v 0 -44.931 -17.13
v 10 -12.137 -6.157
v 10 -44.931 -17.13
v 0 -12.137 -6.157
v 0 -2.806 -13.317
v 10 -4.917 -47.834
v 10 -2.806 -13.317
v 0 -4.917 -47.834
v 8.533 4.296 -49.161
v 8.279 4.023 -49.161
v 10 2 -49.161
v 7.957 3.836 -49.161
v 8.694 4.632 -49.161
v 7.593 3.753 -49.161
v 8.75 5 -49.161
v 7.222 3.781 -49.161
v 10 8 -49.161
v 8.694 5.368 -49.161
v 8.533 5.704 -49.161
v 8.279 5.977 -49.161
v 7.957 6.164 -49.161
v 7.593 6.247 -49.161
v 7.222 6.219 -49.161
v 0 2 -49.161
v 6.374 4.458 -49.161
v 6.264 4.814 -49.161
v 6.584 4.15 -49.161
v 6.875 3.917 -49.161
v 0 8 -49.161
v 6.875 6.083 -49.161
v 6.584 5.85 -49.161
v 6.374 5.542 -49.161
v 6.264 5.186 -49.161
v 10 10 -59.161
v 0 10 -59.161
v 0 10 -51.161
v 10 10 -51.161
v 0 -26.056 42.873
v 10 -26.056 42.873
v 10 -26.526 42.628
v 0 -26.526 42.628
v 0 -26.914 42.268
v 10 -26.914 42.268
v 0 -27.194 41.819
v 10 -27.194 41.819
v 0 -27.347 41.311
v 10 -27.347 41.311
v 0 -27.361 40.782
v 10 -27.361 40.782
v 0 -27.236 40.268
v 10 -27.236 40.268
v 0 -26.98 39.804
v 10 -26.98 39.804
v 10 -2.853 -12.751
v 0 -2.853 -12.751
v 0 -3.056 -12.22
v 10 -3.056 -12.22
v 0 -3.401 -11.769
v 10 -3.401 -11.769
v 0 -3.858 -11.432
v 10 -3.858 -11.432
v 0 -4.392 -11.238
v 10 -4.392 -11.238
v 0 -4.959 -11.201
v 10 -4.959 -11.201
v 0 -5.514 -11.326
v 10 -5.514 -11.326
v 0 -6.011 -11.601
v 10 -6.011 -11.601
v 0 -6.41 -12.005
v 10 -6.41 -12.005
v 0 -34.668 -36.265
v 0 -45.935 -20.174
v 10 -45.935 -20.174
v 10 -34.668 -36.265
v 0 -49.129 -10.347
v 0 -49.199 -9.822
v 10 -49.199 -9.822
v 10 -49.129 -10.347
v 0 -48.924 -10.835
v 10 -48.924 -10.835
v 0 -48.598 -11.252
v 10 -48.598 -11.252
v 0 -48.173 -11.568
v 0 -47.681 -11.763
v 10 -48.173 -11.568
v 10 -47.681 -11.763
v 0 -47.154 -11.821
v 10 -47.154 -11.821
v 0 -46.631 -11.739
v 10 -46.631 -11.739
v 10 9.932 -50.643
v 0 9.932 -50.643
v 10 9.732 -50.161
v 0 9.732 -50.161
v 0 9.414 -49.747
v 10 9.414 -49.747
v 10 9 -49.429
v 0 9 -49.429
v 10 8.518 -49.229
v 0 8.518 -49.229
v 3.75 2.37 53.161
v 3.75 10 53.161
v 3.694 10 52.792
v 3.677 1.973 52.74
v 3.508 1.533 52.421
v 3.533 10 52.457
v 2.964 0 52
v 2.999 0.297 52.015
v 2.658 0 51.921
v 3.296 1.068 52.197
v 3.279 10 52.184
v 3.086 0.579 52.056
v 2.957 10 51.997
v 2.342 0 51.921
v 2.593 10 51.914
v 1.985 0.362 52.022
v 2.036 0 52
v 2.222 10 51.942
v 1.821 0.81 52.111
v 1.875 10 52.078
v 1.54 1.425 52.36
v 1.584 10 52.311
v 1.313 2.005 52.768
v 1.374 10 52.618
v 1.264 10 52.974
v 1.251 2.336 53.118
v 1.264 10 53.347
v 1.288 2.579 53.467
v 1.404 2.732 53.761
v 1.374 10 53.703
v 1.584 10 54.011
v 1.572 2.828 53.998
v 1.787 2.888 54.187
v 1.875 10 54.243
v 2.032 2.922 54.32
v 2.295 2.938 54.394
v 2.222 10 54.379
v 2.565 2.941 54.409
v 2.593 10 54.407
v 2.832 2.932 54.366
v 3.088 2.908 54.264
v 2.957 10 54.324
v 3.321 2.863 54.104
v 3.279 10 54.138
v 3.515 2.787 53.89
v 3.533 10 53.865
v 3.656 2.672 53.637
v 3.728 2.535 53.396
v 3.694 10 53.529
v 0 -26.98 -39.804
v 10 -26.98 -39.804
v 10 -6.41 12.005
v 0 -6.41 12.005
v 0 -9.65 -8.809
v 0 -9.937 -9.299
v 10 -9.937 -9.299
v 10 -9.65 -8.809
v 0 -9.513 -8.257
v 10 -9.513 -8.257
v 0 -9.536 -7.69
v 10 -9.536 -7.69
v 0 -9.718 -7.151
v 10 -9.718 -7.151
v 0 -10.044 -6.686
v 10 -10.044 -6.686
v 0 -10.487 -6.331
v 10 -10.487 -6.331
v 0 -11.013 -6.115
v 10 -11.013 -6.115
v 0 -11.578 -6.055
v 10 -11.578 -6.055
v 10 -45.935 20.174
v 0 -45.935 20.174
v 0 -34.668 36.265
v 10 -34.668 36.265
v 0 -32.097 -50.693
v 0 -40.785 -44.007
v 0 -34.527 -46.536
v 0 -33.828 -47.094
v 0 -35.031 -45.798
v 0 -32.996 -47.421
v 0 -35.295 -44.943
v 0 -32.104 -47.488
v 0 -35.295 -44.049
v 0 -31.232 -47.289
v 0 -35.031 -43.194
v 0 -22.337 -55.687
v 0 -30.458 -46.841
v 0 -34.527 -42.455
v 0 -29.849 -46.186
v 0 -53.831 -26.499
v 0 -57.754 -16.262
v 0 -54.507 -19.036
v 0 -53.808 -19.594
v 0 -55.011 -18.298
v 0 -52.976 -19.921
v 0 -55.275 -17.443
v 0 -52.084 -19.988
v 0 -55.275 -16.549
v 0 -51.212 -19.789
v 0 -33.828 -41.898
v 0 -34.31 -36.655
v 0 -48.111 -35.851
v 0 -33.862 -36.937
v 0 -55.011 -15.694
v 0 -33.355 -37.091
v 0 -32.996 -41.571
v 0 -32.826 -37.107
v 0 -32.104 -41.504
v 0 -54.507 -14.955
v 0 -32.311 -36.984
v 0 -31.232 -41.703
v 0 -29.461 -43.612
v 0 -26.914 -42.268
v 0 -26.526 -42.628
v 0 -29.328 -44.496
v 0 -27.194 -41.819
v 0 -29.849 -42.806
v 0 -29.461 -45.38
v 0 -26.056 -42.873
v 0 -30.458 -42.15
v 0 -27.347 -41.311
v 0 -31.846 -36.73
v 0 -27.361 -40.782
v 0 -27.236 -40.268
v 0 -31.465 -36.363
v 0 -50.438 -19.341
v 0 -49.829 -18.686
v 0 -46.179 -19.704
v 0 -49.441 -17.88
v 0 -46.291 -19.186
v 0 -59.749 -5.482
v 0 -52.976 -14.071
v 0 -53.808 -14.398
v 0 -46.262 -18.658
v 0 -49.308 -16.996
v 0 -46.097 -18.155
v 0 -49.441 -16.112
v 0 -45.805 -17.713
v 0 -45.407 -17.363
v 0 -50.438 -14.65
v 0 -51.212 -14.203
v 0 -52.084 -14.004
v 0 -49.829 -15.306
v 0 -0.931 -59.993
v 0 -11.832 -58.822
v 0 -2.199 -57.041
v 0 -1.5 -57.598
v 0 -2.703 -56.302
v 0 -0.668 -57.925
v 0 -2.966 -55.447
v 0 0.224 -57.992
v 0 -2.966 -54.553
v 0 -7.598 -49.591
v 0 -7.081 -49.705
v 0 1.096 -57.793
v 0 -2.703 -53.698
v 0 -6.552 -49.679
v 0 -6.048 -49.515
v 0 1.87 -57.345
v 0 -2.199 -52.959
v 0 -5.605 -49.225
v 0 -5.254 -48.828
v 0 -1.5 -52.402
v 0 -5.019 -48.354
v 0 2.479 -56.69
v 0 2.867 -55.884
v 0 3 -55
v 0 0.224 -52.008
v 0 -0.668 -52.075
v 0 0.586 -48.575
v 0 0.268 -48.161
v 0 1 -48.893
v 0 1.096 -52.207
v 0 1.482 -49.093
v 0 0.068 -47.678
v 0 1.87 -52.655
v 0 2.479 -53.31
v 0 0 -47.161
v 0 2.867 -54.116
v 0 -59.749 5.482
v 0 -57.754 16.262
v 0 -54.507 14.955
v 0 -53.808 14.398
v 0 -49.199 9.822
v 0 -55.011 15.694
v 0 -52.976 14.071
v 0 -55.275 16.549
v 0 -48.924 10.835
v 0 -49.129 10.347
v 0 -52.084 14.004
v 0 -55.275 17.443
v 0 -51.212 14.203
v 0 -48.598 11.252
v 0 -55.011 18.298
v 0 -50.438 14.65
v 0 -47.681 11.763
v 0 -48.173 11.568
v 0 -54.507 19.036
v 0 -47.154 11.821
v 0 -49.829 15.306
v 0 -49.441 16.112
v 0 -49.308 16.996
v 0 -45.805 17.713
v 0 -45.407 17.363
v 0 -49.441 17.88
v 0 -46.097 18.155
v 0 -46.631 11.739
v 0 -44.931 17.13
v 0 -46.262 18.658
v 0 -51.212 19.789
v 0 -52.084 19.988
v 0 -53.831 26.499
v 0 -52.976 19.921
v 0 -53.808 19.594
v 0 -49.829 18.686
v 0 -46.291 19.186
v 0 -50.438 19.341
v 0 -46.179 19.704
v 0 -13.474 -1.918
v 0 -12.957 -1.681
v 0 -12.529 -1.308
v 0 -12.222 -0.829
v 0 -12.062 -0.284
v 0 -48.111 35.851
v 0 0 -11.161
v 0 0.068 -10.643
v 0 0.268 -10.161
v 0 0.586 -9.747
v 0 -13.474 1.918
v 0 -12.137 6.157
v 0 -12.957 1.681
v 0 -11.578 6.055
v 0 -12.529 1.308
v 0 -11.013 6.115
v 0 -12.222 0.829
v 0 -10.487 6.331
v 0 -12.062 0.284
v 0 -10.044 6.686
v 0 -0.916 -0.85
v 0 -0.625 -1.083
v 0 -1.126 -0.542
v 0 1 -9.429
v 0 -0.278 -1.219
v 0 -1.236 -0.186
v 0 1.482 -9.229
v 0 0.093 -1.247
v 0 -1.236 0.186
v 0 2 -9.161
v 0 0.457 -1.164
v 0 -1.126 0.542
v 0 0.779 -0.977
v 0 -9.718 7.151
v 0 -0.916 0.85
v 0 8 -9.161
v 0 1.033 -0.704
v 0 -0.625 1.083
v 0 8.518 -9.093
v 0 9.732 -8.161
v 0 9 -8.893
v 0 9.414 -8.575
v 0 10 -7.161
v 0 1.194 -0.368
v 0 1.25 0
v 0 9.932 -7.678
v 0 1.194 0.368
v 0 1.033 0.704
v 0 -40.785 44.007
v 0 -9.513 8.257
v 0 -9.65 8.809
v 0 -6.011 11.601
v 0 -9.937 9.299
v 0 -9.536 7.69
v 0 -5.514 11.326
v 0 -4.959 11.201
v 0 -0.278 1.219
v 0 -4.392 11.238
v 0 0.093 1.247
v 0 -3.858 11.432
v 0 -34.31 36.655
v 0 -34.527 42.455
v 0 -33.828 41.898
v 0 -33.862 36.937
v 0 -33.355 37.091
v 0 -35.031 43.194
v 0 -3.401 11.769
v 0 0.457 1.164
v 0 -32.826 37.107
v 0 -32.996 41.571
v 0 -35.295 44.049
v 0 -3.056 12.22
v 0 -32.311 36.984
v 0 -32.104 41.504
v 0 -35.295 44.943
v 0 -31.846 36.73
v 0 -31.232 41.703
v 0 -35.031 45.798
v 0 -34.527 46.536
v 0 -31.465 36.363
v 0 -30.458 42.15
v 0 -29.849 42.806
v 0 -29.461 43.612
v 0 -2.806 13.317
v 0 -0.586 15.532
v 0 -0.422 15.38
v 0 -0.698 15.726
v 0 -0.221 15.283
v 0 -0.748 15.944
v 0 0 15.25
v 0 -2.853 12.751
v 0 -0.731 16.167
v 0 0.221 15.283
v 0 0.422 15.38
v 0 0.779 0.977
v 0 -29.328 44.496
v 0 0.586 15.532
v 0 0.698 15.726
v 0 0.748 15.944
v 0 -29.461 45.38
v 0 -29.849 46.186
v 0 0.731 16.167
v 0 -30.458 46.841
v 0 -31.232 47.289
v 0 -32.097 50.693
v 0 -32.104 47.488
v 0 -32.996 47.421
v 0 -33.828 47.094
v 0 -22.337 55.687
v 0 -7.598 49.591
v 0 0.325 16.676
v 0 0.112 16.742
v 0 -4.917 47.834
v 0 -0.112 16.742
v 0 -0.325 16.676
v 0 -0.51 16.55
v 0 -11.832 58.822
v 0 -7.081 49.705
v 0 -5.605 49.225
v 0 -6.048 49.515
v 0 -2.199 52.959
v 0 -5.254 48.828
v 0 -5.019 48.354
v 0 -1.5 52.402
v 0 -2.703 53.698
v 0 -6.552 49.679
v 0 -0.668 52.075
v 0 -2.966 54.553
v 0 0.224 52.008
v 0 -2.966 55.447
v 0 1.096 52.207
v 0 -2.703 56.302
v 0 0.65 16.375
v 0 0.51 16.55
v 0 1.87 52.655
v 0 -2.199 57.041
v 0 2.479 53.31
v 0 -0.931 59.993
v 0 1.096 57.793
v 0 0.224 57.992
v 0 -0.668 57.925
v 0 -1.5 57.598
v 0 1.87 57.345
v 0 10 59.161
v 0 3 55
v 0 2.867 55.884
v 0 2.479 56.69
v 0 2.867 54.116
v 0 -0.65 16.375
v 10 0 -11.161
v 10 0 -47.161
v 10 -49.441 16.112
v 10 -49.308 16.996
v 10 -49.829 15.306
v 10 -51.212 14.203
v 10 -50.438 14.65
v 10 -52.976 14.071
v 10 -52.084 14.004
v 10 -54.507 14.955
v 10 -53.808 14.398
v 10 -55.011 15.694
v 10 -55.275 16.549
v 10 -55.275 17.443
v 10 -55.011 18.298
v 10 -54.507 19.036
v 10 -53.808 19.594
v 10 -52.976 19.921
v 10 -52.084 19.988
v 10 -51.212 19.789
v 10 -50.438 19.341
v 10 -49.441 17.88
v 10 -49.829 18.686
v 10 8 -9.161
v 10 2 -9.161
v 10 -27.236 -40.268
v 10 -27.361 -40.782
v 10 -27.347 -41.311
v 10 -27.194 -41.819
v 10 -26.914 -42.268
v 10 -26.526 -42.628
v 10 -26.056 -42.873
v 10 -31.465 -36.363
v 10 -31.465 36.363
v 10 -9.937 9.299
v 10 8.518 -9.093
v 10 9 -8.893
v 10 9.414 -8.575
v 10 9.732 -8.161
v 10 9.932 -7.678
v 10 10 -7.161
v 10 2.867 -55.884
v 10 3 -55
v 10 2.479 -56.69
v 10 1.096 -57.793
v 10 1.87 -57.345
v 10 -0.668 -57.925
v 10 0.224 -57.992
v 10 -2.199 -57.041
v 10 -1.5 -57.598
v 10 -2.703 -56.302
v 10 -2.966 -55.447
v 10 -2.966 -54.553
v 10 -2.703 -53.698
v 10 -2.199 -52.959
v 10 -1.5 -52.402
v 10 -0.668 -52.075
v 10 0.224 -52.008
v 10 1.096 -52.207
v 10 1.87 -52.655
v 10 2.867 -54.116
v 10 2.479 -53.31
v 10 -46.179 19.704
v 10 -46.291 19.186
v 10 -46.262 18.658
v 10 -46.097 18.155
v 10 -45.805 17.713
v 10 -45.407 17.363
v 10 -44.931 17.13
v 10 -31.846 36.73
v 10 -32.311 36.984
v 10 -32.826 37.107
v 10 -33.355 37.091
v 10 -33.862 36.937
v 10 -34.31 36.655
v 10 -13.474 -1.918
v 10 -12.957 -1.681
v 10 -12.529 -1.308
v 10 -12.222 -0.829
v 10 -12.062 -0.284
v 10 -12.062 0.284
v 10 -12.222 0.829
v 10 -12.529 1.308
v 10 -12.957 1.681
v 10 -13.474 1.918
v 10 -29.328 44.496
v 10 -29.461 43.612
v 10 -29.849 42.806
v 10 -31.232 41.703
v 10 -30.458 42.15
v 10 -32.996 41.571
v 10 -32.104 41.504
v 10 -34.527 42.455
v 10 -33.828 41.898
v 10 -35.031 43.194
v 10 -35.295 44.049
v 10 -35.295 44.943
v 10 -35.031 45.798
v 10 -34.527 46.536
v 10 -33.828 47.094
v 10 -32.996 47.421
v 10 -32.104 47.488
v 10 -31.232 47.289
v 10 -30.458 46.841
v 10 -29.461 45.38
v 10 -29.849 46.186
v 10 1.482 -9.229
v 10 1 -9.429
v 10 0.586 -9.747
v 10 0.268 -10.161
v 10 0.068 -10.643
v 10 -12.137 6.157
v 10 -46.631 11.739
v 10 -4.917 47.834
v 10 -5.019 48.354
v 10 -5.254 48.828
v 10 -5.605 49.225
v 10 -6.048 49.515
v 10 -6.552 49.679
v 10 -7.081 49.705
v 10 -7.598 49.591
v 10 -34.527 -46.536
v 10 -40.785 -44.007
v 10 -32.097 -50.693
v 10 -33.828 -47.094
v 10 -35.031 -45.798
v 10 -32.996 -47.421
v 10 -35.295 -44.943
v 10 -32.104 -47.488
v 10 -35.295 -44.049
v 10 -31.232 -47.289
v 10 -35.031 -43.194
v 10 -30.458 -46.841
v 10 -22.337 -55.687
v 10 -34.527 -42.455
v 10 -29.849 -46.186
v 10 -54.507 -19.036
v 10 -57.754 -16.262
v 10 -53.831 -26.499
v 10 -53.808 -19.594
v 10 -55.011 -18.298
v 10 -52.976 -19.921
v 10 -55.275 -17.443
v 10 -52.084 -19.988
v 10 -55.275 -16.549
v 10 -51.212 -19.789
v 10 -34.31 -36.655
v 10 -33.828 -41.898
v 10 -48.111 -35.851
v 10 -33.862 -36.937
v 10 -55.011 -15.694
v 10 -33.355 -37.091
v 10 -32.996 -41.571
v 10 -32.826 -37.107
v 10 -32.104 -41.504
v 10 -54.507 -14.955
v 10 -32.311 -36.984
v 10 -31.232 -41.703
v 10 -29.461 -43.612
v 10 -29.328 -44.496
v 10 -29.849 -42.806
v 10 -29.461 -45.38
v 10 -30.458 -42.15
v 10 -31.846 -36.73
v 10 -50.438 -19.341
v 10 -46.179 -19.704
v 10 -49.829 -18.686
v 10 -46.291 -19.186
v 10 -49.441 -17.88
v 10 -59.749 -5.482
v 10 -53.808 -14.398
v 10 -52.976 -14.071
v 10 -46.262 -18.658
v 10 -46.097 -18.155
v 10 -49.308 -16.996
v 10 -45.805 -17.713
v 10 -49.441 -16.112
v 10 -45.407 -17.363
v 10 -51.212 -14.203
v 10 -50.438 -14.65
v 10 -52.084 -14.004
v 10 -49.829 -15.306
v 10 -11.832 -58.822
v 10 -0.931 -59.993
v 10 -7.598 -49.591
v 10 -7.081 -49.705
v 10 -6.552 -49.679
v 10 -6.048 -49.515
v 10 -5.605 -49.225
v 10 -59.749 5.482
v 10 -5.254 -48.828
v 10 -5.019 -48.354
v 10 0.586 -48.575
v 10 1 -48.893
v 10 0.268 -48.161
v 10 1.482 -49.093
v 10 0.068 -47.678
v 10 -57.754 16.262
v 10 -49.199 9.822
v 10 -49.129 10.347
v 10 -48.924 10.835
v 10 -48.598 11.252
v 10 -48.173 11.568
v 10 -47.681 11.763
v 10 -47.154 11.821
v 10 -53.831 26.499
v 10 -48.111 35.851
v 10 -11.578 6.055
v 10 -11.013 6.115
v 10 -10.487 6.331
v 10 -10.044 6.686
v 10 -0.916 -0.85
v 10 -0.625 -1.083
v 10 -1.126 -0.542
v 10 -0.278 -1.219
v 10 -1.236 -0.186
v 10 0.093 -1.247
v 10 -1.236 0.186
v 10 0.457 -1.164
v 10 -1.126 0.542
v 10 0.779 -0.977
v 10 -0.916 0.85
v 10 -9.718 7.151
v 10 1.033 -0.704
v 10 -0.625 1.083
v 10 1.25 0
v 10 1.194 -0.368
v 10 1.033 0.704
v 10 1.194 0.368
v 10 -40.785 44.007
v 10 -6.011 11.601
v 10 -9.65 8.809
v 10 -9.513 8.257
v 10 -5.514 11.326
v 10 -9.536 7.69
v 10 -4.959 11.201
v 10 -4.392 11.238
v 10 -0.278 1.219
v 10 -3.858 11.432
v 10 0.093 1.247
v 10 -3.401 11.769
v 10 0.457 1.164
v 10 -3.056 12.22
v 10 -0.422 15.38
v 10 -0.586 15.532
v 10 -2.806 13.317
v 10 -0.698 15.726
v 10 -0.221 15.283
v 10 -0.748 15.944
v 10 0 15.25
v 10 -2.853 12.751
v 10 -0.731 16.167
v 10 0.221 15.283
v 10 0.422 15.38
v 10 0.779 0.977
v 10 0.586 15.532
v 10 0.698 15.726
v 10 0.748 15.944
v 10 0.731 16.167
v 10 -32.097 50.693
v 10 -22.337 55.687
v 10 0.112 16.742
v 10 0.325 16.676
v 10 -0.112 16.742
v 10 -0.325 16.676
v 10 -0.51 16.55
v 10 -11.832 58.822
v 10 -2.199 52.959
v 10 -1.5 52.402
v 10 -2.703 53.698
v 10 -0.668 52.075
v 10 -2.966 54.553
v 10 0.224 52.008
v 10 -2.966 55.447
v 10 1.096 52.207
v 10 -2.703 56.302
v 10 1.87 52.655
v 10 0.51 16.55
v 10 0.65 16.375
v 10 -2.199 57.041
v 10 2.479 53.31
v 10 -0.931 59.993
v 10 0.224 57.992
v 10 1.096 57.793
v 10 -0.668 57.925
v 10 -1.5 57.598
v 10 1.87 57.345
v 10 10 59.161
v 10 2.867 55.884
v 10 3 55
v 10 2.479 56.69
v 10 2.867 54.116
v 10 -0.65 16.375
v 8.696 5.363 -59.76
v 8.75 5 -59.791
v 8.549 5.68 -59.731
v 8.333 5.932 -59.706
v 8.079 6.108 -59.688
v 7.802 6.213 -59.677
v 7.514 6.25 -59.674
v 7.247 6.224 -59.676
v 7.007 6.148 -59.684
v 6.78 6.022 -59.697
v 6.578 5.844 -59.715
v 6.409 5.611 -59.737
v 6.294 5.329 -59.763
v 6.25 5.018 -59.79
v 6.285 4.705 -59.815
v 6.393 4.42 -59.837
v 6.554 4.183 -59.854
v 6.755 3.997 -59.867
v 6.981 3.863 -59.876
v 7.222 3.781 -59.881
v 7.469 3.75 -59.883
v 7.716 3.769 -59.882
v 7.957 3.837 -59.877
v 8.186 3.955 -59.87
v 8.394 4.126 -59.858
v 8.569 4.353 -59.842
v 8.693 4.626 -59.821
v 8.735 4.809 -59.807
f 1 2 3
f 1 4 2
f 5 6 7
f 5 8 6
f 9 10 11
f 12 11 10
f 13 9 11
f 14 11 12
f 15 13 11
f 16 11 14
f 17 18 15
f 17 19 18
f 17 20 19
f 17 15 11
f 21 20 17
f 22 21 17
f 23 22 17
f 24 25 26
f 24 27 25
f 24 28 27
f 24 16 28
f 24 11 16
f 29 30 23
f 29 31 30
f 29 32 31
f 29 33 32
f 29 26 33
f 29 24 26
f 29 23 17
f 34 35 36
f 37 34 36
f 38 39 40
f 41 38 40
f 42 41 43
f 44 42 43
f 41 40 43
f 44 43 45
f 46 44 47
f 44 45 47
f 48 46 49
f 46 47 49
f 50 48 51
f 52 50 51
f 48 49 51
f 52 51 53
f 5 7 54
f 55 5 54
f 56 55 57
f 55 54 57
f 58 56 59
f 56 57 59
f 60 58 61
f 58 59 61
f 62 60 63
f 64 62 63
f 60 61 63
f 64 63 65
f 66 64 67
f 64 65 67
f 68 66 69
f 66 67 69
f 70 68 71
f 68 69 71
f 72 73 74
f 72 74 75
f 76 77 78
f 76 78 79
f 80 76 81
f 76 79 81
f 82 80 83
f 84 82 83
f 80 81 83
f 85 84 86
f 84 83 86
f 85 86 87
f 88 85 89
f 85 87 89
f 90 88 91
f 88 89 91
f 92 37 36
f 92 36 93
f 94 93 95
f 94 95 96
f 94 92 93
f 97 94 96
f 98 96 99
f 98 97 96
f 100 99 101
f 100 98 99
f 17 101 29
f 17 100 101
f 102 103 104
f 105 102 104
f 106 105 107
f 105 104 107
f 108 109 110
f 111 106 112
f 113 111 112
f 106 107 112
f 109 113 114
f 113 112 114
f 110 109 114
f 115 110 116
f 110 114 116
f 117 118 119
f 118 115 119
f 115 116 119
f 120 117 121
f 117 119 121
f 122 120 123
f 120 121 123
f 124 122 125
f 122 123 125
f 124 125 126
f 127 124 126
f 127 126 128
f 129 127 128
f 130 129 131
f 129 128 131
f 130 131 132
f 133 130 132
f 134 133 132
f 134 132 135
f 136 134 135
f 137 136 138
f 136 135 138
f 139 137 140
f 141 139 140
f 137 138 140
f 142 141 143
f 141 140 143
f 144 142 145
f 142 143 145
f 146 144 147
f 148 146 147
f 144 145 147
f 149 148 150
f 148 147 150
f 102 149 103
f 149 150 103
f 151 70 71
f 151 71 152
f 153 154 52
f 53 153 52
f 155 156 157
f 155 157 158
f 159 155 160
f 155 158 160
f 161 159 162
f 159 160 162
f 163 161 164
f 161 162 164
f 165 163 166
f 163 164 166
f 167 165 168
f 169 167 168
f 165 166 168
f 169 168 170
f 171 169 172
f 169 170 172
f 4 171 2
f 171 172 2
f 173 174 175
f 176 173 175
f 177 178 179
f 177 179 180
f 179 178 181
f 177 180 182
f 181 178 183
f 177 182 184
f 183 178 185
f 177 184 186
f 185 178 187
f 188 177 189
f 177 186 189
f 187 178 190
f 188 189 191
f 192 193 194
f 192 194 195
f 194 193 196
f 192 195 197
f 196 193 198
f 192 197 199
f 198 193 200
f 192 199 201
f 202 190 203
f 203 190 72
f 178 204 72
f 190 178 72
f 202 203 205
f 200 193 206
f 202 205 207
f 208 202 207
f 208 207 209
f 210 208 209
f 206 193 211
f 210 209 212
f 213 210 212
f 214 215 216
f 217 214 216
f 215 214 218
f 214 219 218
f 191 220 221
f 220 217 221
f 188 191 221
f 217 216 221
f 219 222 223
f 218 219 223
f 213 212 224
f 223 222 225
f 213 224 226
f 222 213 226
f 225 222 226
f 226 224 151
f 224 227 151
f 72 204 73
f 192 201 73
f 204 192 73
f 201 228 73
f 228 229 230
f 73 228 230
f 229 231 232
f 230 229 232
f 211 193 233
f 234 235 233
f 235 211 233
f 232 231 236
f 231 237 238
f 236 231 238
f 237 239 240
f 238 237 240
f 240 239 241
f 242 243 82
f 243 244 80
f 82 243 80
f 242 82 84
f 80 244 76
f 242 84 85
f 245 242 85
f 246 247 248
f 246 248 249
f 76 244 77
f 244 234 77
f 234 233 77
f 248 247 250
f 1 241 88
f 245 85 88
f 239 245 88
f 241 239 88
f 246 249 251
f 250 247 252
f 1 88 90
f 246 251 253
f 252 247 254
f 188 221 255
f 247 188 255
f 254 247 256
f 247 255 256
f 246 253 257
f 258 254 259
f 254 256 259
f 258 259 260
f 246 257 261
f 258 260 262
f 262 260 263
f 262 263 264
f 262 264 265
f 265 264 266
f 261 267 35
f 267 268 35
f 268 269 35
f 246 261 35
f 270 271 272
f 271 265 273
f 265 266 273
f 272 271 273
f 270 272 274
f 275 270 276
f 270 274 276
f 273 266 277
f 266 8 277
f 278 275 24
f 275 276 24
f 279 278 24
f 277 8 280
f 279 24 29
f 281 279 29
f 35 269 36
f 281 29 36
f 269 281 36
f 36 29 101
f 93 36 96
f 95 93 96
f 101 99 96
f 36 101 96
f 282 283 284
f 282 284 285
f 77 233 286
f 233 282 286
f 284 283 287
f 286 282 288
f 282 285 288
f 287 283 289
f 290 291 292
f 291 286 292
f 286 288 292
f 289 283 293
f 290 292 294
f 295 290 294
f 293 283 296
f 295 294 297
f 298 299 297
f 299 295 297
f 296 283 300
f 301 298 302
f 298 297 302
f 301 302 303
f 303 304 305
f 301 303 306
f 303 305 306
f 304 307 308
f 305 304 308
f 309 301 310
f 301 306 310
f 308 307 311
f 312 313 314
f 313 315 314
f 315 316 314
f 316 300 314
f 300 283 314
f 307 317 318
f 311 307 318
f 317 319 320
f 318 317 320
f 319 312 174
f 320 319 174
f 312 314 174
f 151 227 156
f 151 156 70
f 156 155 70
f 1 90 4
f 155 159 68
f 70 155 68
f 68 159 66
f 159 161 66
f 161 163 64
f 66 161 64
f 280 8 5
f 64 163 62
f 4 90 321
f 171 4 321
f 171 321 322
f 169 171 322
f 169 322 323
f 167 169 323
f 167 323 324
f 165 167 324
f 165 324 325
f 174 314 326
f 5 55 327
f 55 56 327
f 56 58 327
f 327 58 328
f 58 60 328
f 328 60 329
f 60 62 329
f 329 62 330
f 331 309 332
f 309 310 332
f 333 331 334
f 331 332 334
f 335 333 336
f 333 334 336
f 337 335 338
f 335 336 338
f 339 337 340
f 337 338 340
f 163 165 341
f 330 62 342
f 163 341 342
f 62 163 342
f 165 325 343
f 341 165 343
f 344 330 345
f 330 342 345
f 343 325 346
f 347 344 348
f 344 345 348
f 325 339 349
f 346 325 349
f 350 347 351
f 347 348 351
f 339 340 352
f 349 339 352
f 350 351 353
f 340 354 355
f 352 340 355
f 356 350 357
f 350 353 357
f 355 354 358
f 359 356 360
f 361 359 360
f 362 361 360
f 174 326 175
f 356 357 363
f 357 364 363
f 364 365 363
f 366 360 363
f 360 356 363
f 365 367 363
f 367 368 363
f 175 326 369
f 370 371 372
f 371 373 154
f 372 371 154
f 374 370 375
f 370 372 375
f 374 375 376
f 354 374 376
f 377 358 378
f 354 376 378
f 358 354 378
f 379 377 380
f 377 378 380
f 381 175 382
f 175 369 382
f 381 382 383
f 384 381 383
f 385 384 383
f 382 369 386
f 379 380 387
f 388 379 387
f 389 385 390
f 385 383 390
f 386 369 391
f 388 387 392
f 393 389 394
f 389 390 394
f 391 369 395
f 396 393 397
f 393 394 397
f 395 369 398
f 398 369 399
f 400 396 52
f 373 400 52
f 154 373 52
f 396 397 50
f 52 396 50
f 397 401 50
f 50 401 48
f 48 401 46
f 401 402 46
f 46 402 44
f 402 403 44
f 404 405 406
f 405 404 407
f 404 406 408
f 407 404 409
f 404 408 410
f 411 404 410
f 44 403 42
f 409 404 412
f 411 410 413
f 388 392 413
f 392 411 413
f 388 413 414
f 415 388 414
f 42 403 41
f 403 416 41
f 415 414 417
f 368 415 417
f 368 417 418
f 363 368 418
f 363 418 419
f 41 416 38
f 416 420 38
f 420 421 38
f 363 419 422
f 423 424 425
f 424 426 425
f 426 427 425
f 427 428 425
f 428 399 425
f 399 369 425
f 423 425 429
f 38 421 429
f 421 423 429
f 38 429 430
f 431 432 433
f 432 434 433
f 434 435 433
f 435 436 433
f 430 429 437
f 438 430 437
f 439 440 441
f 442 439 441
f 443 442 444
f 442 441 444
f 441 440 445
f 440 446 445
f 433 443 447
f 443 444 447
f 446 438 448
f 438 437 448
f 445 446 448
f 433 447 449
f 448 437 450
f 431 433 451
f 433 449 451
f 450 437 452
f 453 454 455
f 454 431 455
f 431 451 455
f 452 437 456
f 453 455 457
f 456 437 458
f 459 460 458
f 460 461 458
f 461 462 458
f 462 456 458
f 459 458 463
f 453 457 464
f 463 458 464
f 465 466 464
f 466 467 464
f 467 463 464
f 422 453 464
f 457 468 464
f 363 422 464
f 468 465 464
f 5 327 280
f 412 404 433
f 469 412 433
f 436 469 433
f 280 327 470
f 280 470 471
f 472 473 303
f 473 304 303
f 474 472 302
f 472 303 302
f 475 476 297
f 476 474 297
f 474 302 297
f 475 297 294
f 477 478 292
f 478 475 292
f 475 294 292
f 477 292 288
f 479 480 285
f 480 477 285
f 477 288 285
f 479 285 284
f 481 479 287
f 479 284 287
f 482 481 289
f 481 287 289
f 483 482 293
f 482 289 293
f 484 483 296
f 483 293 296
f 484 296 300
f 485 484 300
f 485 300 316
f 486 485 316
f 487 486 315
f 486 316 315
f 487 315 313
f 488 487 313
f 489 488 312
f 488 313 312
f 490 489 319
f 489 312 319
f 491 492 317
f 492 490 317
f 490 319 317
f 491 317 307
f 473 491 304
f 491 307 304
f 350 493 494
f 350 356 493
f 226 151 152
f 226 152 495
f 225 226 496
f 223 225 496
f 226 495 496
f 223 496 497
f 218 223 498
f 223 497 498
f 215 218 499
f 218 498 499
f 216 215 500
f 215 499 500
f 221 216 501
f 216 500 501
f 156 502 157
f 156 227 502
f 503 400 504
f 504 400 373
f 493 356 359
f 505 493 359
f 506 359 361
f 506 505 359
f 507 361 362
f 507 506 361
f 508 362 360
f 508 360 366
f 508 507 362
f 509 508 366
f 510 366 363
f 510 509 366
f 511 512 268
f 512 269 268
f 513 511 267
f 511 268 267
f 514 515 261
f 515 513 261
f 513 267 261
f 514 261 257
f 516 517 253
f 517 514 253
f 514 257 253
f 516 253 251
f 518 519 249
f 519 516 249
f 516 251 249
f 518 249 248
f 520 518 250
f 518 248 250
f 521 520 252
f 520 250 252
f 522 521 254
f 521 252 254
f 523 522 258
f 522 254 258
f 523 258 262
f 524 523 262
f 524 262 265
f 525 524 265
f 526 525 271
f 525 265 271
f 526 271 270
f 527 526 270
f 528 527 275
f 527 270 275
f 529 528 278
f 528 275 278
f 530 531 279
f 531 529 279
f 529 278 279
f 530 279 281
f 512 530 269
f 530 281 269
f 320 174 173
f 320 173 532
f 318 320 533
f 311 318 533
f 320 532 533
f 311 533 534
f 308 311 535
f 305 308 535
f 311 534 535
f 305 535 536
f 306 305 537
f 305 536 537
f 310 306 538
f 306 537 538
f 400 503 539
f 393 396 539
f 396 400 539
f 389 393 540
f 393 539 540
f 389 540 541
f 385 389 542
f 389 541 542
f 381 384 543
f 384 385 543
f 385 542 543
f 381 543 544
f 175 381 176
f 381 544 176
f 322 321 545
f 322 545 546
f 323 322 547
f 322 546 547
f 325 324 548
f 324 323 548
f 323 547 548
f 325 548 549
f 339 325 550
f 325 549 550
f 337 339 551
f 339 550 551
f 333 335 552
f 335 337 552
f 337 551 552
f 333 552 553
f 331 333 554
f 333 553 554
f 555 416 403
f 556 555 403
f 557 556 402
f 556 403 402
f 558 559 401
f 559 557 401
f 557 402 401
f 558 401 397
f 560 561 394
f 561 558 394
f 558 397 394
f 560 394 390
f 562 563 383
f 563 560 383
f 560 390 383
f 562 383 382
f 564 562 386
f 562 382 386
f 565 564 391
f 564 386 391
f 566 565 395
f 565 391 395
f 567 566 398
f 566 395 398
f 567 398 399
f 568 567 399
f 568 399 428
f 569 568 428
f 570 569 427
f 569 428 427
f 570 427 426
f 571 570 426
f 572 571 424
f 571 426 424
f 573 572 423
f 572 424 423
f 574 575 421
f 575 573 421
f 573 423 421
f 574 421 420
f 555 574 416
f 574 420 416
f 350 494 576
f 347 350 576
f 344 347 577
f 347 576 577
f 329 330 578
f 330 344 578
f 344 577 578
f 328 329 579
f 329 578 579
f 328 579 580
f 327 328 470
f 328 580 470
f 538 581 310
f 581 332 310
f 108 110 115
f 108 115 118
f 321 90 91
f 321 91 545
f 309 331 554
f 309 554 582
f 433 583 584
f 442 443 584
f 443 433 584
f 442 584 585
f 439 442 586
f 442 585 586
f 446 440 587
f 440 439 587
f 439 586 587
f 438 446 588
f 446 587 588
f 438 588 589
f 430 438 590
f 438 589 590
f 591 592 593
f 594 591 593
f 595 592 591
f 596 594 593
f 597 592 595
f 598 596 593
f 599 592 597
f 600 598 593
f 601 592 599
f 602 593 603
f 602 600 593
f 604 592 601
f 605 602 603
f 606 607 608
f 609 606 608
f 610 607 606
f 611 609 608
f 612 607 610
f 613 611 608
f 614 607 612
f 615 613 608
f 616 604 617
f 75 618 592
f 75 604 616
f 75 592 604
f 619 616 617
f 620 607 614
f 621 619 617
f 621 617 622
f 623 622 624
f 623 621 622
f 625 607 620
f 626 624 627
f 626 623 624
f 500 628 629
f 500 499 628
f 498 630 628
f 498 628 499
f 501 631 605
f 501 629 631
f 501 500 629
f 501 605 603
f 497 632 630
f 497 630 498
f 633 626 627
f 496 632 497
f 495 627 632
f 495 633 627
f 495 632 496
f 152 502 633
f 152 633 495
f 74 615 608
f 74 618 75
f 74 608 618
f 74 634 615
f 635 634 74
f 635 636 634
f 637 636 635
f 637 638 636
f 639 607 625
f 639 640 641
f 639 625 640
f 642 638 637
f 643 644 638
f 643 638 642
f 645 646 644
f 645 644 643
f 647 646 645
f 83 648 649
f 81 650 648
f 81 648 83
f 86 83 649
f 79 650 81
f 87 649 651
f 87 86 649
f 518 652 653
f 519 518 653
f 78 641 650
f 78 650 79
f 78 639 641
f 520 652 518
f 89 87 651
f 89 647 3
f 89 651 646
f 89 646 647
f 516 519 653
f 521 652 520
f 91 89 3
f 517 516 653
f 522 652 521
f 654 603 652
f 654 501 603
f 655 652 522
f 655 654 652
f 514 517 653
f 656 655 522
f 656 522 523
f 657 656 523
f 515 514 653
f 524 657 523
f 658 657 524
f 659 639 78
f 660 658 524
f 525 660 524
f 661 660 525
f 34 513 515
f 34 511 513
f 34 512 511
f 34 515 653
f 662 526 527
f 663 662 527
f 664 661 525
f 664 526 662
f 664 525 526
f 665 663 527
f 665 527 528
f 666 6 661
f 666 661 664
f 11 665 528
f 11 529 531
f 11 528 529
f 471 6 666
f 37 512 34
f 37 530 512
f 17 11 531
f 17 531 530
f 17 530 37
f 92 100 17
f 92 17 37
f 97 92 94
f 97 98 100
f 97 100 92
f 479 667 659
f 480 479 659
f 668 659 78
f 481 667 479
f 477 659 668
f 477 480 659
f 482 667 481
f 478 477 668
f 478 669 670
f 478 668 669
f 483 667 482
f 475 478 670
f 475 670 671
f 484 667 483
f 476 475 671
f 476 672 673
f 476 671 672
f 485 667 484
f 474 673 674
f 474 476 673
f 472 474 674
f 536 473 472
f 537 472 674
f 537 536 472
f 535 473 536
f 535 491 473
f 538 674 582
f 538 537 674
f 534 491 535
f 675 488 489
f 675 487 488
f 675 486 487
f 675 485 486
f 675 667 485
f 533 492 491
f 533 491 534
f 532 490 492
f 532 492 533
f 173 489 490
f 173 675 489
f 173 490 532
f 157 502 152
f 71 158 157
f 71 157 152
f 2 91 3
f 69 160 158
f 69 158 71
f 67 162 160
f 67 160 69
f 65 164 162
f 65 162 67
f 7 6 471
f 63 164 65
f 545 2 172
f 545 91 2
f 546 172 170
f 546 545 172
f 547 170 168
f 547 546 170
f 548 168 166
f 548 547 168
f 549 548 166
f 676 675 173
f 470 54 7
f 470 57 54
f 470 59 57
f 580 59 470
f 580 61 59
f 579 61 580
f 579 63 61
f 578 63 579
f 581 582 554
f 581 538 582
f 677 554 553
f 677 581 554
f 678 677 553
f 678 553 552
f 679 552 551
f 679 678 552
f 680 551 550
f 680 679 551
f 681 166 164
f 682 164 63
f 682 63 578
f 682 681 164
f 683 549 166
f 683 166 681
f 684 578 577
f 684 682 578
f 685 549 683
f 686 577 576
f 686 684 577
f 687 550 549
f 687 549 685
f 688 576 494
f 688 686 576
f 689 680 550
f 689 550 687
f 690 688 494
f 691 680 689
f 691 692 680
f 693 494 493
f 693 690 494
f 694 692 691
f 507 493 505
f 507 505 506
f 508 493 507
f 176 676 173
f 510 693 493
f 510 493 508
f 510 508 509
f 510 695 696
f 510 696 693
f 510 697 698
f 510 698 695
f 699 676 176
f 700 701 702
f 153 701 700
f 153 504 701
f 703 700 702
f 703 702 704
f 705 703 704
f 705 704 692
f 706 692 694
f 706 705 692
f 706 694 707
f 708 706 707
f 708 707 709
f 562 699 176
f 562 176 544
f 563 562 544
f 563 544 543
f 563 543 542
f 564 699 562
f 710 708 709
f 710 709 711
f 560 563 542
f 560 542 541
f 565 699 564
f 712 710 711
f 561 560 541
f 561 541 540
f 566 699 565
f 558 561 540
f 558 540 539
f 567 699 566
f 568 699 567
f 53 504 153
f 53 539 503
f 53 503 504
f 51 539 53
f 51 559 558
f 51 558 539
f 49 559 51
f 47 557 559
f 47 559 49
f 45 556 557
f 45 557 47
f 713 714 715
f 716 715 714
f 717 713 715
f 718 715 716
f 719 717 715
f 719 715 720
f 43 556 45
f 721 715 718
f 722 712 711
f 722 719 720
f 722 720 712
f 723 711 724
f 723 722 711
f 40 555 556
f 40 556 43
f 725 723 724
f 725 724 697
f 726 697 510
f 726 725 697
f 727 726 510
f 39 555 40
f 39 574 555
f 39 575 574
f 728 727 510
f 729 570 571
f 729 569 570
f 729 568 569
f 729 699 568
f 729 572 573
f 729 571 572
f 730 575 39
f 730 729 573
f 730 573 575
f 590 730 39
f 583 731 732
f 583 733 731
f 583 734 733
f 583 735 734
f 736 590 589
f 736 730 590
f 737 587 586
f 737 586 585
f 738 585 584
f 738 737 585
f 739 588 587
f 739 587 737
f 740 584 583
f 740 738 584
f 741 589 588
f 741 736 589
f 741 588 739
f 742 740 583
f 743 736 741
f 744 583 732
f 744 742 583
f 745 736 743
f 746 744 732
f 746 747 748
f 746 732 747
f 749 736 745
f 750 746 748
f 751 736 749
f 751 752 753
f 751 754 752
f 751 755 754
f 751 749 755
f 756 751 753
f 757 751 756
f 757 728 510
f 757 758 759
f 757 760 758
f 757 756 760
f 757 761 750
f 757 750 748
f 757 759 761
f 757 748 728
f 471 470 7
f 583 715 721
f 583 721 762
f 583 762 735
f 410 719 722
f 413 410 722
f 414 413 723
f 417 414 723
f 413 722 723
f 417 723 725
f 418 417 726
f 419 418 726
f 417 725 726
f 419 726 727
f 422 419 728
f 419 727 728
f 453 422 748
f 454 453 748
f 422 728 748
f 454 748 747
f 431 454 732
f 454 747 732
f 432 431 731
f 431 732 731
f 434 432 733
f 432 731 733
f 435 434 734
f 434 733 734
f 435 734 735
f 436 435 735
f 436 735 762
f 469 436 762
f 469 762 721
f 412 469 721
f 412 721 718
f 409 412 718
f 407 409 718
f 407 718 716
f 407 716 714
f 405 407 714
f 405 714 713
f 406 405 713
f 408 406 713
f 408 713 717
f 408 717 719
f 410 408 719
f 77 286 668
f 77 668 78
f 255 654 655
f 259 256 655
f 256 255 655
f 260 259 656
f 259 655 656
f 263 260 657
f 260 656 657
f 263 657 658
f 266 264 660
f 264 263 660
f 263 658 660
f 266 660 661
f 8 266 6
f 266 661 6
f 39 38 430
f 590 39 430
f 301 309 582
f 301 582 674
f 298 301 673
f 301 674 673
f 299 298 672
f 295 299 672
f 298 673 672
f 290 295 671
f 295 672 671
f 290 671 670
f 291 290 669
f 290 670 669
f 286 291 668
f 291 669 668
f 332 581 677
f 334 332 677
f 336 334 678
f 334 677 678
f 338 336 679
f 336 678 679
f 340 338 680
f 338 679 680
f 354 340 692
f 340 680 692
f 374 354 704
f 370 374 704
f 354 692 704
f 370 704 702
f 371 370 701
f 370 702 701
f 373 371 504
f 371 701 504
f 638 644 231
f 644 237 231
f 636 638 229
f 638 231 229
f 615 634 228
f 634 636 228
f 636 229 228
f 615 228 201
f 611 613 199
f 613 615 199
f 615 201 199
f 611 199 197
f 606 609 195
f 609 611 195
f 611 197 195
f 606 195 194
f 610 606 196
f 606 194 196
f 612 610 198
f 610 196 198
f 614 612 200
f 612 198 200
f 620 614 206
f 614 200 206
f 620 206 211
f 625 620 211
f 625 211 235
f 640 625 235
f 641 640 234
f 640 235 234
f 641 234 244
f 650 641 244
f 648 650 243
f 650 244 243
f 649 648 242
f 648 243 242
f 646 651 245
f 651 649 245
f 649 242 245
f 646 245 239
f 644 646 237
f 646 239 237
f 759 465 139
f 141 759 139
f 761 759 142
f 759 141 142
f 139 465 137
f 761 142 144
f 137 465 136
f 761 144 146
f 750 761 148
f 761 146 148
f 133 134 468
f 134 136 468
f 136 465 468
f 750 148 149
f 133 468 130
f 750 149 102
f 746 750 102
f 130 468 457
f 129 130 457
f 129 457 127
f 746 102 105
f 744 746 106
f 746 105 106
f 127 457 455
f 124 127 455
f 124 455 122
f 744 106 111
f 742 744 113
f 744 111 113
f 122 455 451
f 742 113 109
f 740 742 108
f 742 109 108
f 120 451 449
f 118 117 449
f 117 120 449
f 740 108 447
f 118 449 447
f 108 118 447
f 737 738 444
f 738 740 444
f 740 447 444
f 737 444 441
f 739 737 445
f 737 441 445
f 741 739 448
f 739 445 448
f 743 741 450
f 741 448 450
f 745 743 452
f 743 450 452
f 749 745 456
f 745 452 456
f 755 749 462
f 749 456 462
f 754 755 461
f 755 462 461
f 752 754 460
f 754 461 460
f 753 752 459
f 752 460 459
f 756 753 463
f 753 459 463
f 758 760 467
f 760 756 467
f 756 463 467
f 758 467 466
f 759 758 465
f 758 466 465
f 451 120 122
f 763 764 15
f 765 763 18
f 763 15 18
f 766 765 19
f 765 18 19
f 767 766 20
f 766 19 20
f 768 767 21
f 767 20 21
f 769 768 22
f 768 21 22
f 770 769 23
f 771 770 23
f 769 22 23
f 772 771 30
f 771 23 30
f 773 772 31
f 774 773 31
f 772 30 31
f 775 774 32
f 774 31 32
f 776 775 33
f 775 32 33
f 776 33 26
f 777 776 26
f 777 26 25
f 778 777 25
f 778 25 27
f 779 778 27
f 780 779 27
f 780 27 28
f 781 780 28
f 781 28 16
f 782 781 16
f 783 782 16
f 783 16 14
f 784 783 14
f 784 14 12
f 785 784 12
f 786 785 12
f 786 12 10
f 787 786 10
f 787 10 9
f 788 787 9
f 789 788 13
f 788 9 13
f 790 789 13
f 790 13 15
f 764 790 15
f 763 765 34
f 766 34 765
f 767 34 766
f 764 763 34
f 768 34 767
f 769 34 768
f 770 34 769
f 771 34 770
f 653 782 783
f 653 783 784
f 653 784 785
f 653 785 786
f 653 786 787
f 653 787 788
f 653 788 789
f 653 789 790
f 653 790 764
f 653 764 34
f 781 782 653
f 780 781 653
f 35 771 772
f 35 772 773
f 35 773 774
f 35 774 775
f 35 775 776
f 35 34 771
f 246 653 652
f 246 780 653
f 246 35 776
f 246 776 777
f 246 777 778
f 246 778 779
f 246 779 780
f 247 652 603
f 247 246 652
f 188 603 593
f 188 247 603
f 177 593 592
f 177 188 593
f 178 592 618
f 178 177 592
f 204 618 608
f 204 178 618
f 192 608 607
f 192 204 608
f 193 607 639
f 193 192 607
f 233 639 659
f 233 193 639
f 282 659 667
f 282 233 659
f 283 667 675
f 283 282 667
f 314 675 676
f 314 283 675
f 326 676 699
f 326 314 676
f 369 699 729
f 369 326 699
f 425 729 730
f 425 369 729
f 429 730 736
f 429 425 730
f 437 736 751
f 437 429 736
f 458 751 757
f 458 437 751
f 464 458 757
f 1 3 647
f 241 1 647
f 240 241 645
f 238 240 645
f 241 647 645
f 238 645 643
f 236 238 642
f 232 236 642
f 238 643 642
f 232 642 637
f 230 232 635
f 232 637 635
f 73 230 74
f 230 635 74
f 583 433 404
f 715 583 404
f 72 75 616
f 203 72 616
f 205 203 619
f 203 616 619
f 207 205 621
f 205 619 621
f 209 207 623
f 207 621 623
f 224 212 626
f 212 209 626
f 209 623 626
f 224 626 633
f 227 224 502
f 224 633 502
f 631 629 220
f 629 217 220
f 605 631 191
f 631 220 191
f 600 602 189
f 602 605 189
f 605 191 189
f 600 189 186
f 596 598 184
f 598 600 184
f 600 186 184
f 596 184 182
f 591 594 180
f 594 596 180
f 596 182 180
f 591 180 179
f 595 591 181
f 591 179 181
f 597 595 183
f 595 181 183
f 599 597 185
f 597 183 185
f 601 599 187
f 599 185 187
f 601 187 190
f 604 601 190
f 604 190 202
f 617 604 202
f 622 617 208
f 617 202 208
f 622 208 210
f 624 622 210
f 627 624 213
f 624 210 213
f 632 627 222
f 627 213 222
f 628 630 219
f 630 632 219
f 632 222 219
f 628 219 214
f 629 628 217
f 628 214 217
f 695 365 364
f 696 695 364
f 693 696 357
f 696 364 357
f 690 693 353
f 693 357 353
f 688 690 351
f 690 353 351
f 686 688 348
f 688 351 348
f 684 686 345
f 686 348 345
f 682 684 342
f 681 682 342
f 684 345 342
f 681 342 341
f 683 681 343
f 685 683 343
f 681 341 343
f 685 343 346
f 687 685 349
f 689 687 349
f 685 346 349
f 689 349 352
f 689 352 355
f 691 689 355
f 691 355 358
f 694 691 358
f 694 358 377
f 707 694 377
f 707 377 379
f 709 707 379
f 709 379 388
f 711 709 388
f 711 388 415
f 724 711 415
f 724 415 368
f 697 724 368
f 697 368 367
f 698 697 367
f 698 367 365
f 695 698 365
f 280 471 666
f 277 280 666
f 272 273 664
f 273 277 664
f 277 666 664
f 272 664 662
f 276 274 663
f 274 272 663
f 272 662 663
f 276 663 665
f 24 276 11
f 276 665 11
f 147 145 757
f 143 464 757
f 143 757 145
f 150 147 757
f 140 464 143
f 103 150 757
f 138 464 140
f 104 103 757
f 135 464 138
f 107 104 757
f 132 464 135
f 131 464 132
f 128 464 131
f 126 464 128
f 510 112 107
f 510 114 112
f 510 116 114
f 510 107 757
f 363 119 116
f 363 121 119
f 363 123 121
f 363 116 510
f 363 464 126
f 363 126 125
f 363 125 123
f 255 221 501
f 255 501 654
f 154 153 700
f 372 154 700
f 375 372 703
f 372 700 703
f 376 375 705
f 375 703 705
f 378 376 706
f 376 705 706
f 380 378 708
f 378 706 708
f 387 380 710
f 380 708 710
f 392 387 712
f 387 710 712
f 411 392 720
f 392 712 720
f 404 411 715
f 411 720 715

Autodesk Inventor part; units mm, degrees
ref_plane "YZ Plane" through (0, 0, 0) normal (1, 0, 0) x (0, 1, 0)
ref_plane "XZ Plane" through (0, 0, 0) normal (0, 1, 0) x (-1, 0, 0)
ref_plane "XY Plane" through (0, 0, 0) normal (0, 0, 1) x (1, 0, 0)
sketch "Skizze1" plane through (0, 0, 0) normal (1, 0, 0) x (0, 1, 0)
  arc A0 (10, 59.1608) -> (10, -59.1608) centre (0, 0) ccw
  line L0 (10, 59.1608) -> (10, -9.1608)
  line L1 (10, -59.1608) -> (10, -49.1608)
  line L2 (10, -9.1608) -> (0, -9.1608)
  line L3 (0, -9.1608) -> (0, -49.1608)
  line L4 (0, -49.1608) -> (10, -49.1608)
  circle A1 centre (0, 55) radius 3
  circle A2 centre (-32.3282, 44.4959) radius 3
  circle A3 centre (-52.3081, 16.9959) radius 3
  circle A4 centre (-52.3081, -16.9959) radius 3
  circle A5 centre (-32.3282, -44.4959) radius 3
  circle A6 centre (0, -55) radius 3
  circle A7 centre (0, 0) radius 1.25
  line L5 (-7, 0) -> (-49.1993, 12.5)
  line L6 (-49.1993, 12.5) -> (-49.1993, -12.5)
  line L7 (-49.1993, -12.5) -> (-7, 0)
  line L8 (-74, 0) -> (24, 0) projected
  line L9 (-33.132, -38.459) -> (-5.7341, -4.015)
  line L10 (-5.7341, -4.015) -> (-47.4714, -17.9802)
  line L11 (-47.4714, -17.9802) -> (-33.132, -38.459)
  line L12 (-5.081, -50.5075) -> (-2.3941, -6.5778)
  line L13 (-2.3941, -6.5778) -> (-28.5733, -41.957)
  line L14 (-28.5733, -41.957) -> (-5.081, -50.5075)
  line L15 (-33.132, 38.459) -> (-5.7341, 4.015)
  line L16 (-5.7341, 4.015) -> (-47.4714, 17.9802)
  line L17 (-47.4714, 17.9802) -> (-33.132, 38.459)
  line L18 (-5.081, 50.5075) -> (-2.3941, 6.5778)
  line L19 (-2.3941, 6.5778) -> (-28.5733, 41.957)
  line L20 (-28.5733, 41.957) -> (-5.081, 50.5075)
  dimension "d0" = 120
  dimension "d1" = 40
  dimension "d2" = 10
  dimension "d3" = 10
  dimension "d4" = 10
  dimension "d5" = 10
  dimension "d6" = 55
  dimension "d7" = 0
  dimension "d8" = 6
  dimension "d11" = 180
  dimension "d13" = 2.5
  dimension "d19" = 33
  dimension "d20" = 12.5
  dimension "d22" = 0
  dimension "d23" = 7
  dimension "d26" = 70
  dimension "d34" = 25
extrude "Extrusion1" add sketch "Skizze1" along normal blind 10 contours L0 L8 A7 L5 L6 A0 | L8 L6 L7 A7 L0 L2 L3 L4 L1 A0
fillet "Rundung1" radius 2 15 edges at (5, -5.081, -50.5075) (5, -28.5733, -41.957) (5, -33.132, -38.459) (5, -47.4714, -17.9802) (5, -49.1993, -12.5) (5, -49.1993, 12.5) (5, -33.132, 38.459) (5, -47.4714, 17.9802) (5, -28.5733, 41.957) (5, -5.081, 50.5075) (5, -2.3941, 6.5778) (5, -5.7341, 4.015) (5, -7, 0) (5, -5.7341, -4.015) (5, -2.3941, -6.5778)
fillet "Rundung2" radius 2 4 edges at (5, 10, -9.1608) (5, 0, -9.1608) (5, 0, -49.1608) (5, 10, -49.1608)
sketch "Skizze2" plane through (10, 0, 0) normal (1, 0, 0) x (0, 0, -1)
  circle A0 centre (-16, 0) radius 0.75
  point P0 (0, 0)
  dimension "d30" = 1.5
  dimension "d31" = 16
extrude "Extrusion2" cut sketch "Skizze2" against normal blind 10
sketch "Skizze3" plane through (0, 2, -49.1608) normal (0, 0, 1) x (1, 0, 0)
  circle A0 centre (7.5, 3) radius 1.25
  line L0 (10, 6) -> (10, 0) projected
  line L1 (0, 6) -> (10, 6) projected
  point P0 (0, -2)
  dimension "d35" = 2.5
  dimension "d36" = 2.5
  dimension "d37" = 3
extrude "Extrusion3" cut sketch "Skizze3" against normal blind 12
sketch "Skizze4" plane through (0, 10, 59.1608) normal (0, 1, 0) x (1, 0, 0)
  circle A0 centre (2.5, 6) radius 1.25
  line L0 (0, 66.3216) -> (0, 0) projected
  line L1 (0, 0) -> (10, 0) projected
  point P0 (0, 59.1608)
  dimension "d40" = 2.5
  dimension "d41" = 2.5
  dimension "d42" = 6
extrude "Extrusion4" cut sketch "Skizze4" against normal blind 10
equation "\"d20\" = 0.5 * d34"
properties part number "Capstondisc"
